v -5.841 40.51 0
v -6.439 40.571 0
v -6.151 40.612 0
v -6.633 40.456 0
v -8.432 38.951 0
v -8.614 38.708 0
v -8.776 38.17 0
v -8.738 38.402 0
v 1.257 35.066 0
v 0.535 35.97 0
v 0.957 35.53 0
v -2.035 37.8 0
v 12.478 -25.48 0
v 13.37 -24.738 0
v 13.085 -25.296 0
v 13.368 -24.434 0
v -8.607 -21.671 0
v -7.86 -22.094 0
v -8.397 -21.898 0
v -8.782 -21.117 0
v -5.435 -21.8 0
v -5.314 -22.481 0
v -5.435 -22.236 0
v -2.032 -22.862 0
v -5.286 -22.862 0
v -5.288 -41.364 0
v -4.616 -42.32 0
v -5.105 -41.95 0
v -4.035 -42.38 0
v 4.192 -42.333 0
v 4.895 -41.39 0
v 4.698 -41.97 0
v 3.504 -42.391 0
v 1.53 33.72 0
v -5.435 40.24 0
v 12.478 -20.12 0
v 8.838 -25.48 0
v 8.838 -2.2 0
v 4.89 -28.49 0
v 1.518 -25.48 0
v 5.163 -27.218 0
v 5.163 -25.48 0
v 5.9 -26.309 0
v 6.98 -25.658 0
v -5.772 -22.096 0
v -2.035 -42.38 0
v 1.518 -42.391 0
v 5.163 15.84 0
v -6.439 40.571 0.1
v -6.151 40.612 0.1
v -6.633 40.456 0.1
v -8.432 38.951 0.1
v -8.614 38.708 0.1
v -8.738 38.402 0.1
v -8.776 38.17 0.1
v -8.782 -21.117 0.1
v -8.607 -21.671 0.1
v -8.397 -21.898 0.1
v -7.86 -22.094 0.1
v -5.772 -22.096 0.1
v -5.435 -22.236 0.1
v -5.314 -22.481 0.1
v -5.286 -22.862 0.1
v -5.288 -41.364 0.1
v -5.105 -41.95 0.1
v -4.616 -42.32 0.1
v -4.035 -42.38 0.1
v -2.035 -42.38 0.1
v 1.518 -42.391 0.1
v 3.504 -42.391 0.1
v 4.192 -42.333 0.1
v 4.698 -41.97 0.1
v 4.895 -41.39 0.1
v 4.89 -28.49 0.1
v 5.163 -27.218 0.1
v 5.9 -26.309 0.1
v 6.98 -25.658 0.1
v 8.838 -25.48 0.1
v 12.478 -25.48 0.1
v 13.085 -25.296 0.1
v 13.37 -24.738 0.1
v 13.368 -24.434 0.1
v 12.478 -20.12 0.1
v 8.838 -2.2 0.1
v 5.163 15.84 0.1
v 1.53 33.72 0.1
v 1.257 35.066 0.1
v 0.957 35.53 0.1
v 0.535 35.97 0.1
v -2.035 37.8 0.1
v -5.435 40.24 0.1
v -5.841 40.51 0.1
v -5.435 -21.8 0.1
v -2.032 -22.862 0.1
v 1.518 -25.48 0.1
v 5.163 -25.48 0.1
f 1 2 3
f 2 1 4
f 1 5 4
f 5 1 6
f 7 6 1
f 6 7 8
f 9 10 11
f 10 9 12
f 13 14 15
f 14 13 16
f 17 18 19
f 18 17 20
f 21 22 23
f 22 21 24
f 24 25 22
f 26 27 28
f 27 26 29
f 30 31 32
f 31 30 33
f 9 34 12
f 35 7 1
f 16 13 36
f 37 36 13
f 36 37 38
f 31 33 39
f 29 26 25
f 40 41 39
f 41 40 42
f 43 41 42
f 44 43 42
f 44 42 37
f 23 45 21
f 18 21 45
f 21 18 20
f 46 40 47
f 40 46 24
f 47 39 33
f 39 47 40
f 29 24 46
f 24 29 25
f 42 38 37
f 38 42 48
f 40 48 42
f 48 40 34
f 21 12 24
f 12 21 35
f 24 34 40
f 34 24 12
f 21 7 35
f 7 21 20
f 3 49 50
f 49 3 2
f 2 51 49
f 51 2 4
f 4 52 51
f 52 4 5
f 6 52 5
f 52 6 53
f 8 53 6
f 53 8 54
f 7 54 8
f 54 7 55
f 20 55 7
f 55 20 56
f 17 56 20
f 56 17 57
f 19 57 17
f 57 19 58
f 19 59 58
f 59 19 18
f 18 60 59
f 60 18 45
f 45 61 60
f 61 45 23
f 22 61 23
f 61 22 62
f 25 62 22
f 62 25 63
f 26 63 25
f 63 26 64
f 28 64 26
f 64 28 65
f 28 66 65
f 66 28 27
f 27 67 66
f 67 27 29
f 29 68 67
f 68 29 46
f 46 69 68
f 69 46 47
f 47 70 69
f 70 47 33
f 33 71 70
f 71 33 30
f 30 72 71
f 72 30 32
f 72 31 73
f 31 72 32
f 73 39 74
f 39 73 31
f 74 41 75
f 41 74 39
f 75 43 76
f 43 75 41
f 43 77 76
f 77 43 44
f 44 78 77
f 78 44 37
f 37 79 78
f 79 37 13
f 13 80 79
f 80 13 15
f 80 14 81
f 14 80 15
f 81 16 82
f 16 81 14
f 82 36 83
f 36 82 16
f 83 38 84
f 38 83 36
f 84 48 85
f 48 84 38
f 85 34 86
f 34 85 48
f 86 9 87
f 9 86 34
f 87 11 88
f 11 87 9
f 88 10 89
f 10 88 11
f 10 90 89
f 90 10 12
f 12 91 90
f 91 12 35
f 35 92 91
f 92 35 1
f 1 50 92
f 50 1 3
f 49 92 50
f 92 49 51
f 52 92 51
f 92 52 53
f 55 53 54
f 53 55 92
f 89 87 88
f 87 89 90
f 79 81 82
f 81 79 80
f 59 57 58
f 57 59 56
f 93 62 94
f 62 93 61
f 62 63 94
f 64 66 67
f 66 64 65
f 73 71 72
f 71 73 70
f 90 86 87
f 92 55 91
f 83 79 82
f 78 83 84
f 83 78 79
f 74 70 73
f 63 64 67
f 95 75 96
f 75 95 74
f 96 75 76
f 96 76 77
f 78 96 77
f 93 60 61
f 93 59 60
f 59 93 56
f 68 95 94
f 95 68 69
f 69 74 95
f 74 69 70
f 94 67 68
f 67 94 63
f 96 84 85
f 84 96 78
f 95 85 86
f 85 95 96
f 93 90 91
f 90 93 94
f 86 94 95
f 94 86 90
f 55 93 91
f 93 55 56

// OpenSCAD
// file: s/13710gs02.scad
use <../../lib.scad>
function ldraw_lib__s__13710gs02() = [
// 0 ~Sticker Top for Technic Panel Fairing Smooth (Long) Flat
// 0 Name: s\13710gs02.dat
// 0 Author: Philippe Hurbain [Philo]
// 0 !LDRAW_ORG Subpart UPDATE 2022-02
// 0 !LICENSE Licensed under CC BY 2.0 and CC BY 4.0 : see CAreadme.txt
// 
// 0 BFC CERTIFY CCW
  [0,"BFC","CERTIFY"],
  [0,"BFC","CCW"],
// 
// 0 !HISTORY 2022-03-06 [PTadmin] Official Update 2022-02
// 
// 
// 0 // Top surface
// 4 16 -14.602 -0.25 101.275 -15.378 -0.25 101.529 -16.097 -0.25 101.427 -16.582 -0.25 101.141
  [4,16,-14.602,-0.25,101.275,-15.378,-0.25,101.529,-16.097,-0.25,101.427,-16.582,-0.25,101.141],
// 4 16 -14.602 -0.25 101.275 -16.582 -0.25 101.141 -21.08 -0.25 97.378 -21.536 -0.25 96.769
  [4,16,-14.602,-0.25,101.275,-16.582,-0.25,101.141,-21.08,-0.25,97.378,-21.536,-0.25,96.769],
// 4 16 -14.602 -0.25 101.275 -21.536 -0.25 96.769 -21.844 -0.25 96.005 -21.94 -0.25 95.424
  [4,16,-14.602,-0.25,101.275,-21.536,-0.25,96.769,-21.844,-0.25,96.005,-21.94,-0.25,95.424],
// 4 16 3.142 -0.25 87.664 2.393 -0.25 88.826 1.338 -0.25 89.925 -5.087 -0.25 94.5
  [4,16,3.142,-0.25,87.664,2.393,-0.25,88.826,1.338,-0.25,89.925,-5.087,-0.25,94.5],
// 4 16 31.196 -0.25 -63.7 32.713 -0.25 -63.241 33.424 -0.25 -61.844 33.421 -0.25 -61.086
  [4,16,31.196,-0.25,-63.7,32.713,-0.25,-63.241,33.424,-0.25,-61.844,33.421,-0.25,-61.086],
// 4 16 -21.954 -0.25 -52.792 -21.518 -0.25 -54.177 -20.993 -0.25 -54.745 -19.65 -0.25 -55.236
  [4,16,-21.954,-0.25,-52.792,-21.518,-0.25,-54.177,-20.993,-0.25,-54.745,-19.65,-0.25,-55.236],
// 4 16 -13.588 -0.25 -55.589 -13.286 -0.25 -56.203 -5.08 -0.25 -57.154 -13.588 -0.25 -54.5
  [4,16,-13.588,-0.25,-55.589,-13.286,-0.25,-56.203,-5.08,-0.25,-57.154,-13.588,-0.25,-54.5],
// 3 16 -13.286 -0.25 -56.203 -13.216 -0.25 -57.156 -5.08 -0.25 -57.154
  [3,16,-13.286,-0.25,-56.203,-13.216,-0.25,-57.156,-5.08,-0.25,-57.154],
// 4 16 -13.22 -0.25 -103.409 -12.762 -0.25 -104.875 -11.54 -0.25 -105.799 -10.088 -0.25 -105.95
  [4,16,-13.22,-0.25,-103.409,-12.762,-0.25,-104.875,-11.54,-0.25,-105.799,-10.088,-0.25,-105.95],
// 4 16 8.76 -0.25 -105.977 10.481 -0.25 -105.833 11.744 -0.25 -104.924 12.237 -0.25 -103.474
  [4,16,8.76,-0.25,-105.977,10.481,-0.25,-105.833,11.744,-0.25,-104.924,12.237,-0.25,-103.474],
// 3 16 -5.087 -0.25 94.5 3.826 -0.25 84.3 3.142 -0.25 87.664
  [3,16,-5.087,-0.25,94.5,3.826,-0.25,84.3,3.142,-0.25,87.664],
// 3 16 -14.602 -0.25 101.275 -21.94 -0.25 95.424 -13.588 -0.25 100.6
  [3,16,-14.602,-0.25,101.275,-21.94,-0.25,95.424,-13.588,-0.25,100.6],
// 3 16 31.196 -0.25 -50.3 31.196 -0.25 -63.7 33.421 -0.25 -61.086
  [3,16,31.196,-0.25,-50.3,31.196,-0.25,-63.7,33.421,-0.25,-61.086],
// 4 16 22.095 -0.25 -63.7 31.196 -0.25 -63.7 31.196 -0.25 -50.3 22.095 -0.25 -5.5
  [4,16,22.095,-0.25,-63.7,31.196,-0.25,-63.7,31.196,-0.25,-50.3,22.095,-0.25,-5.5],
// 3 16 12.225 -0.25 -71.225 8.76 -0.25 -105.977 12.237 -0.25 -103.474
  [3,16,12.225,-0.25,-71.225,8.76,-0.25,-105.977,12.237,-0.25,-103.474],
// 3 16 -13.216 -0.25 -57.156 -13.22 -0.25 -103.409 -10.088 -0.25 -105.95
  [3,16,-13.216,-0.25,-57.156,-13.22,-0.25,-103.409,-10.088,-0.25,-105.95],
// 4 16 3.795 -0.25 -63.7 12.225 -0.25 -71.225 12.908 -0.25 -68.044 12.908 -0.25 -63.7
  [4,16,3.795,-0.25,-63.7,12.225,-0.25,-71.225,12.908,-0.25,-68.044,12.908,-0.25,-63.7],
// 3 16 12.908 -0.25 -63.7 12.908 -0.25 -68.044 14.749 -0.25 -65.772
  [3,16,12.908,-0.25,-63.7,12.908,-0.25,-68.044,14.749,-0.25,-65.772],
// 3 16 12.908 -0.25 -63.7 14.749 -0.25 -65.772 17.451 -0.25 -64.144
  [3,16,12.908,-0.25,-63.7,14.749,-0.25,-65.772,17.451,-0.25,-64.144],
// 3 16 22.095 -0.25 -63.7 12.908 -0.25 -63.7 17.451 -0.25 -64.144
  [3,16,22.095,-0.25,-63.7,12.908,-0.25,-63.7,17.451,-0.25,-64.144],
// 3 16 -13.588 -0.25 -54.5 -14.429 -0.25 -55.241 -13.588 -0.25 -55.589
  [3,16,-13.588,-0.25,-54.5,-14.429,-0.25,-55.241,-13.588,-0.25,-55.589],
// 4 16 -19.65 -0.25 -55.236 -14.429 -0.25 -55.241 -13.588 -0.25 -54.5 -21.954 -0.25 -52.792
  [4,16,-19.65,-0.25,-55.236,-14.429,-0.25,-55.241,-13.588,-0.25,-54.5,-21.954,-0.25,-52.792],
// 4 16 -5.08 -0.25 -57.154 -5.087 -0.25 -105.95 3.795 -0.25 -105.977 3.795 -0.25 -63.7
  [4,16,-5.08,-0.25,-57.154,-5.087,-0.25,-105.95,3.795,-0.25,-105.977,3.795,-0.25,-63.7],
// 4 16 3.795 -0.25 -63.7 3.795 -0.25 -105.977 8.76 -0.25 -105.977 12.225 -0.25 -71.225
  [4,16,3.795,-0.25,-63.7,3.795,-0.25,-105.977,8.76,-0.25,-105.977,12.225,-0.25,-71.225],
// 4 16 -10.088 -0.25 -105.95 -5.087 -0.25 -105.95 -5.08 -0.25 -57.154 -13.216 -0.25 -57.156
  [4,16,-10.088,-0.25,-105.95,-5.087,-0.25,-105.95,-5.08,-0.25,-57.154,-13.216,-0.25,-57.156],
// 4 16 12.908 -0.25 -63.7 22.095 -0.25 -63.7 22.095 -0.25 -5.5 12.908 -0.25 39.6
  [4,16,12.908,-0.25,-63.7,22.095,-0.25,-63.7,22.095,-0.25,-5.5,12.908,-0.25,39.6],
// 4 16 3.795 -0.25 -63.7 12.908 -0.25 -63.7 12.908 -0.25 39.6 3.826 -0.25 84.3
  [4,16,3.795,-0.25,-63.7,12.908,-0.25,-63.7,12.908,-0.25,39.6,3.826,-0.25,84.3],
// 4 16 -5.087 -0.25 94.5 -13.588 -0.25 100.6 -13.588 -0.25 -54.5 -5.08 -0.25 -57.154
  [4,16,-5.087,-0.25,94.5,-13.588,-0.25,100.6,-13.588,-0.25,-54.5,-5.08,-0.25,-57.154],
// 4 16 3.826 -0.25 84.3 -5.087 -0.25 94.5 -5.08 -0.25 -57.154 3.795 -0.25 -63.7
  [4,16,3.826,-0.25,84.3,-5.087,-0.25,94.5,-5.08,-0.25,-57.154,3.795,-0.25,-63.7],
// 4 16 -13.588 -0.25 100.6 -21.94 -0.25 95.424 -21.954 -0.25 -52.792 -13.588 -0.25 -54.5
  [4,16,-13.588,-0.25,100.6,-21.94,-0.25,95.424,-21.954,-0.25,-52.792,-13.588,-0.25,-54.5],
];
makepoly(ldraw_lib__s__13710gs02(), line=0.2);
// main file
use <../lib.scad>
use <s/13710gs01.scad>
use <s/13710gs02.scad>
function ldraw_lib__13710j() = [
// 0 Sticker Mindstorms EV3 #10 for Panel Smooth Long (Needs Work)
// 0 Name: 13710j.dat
// 0 Author: Philippe Hurbain [Philo]
// 0 !LDRAW_ORG Part UPDATE 2022-02
// 0 !LICENSE Licensed under CC BY 2.0 and CC BY 4.0 : see CAreadme.txt
// 
// 0 !HELP To be used with panel 64393
// 
// 0 BFC CERTIFY CCW
  [0,"BFC","CERTIFY"],
  [0,"BFC","CCW"],
// 
// 0 !HISTORY 2022-03-06 [PTadmin] Official Update 2022-02
// 
// 
// 0 // Image file courtesy of the LEGO MINDSTORMS Team
// 0 // Needs Work: Missing more detailed fallback pattern
// 
// 1 16 0 0 0 1 0 0 0 1 0 0 0 1 s\13710gs01.dat
  [1,16,0,0,0,1,0,0,0,1,0,0,0,1, ldraw_lib__s__13710gs01()],
// 0 !TEXMAP START PLANAR 33.424 12.0264 101.529 33.424 12.0264 -105.977 -21.954 12.0264 101.529 13710j.png
// 0 !: 1 15 0 0 0 1 0 0 0 1 0 0 0 1 s\13710gs02.dat
// 0 !TEXMAP FALLBACK
// 1 15 0 0 0 1 0 0 0 1 0 0 0 1 s\13710gs02.dat
  [1,15,0,0,0,1,0,0,0,1,0,0,0,1, ldraw_lib__s__13710gs02()],
// 0 !TEXMAP END
// 
];
makepoly(ldraw_lib__13710j(), line=0.2);
